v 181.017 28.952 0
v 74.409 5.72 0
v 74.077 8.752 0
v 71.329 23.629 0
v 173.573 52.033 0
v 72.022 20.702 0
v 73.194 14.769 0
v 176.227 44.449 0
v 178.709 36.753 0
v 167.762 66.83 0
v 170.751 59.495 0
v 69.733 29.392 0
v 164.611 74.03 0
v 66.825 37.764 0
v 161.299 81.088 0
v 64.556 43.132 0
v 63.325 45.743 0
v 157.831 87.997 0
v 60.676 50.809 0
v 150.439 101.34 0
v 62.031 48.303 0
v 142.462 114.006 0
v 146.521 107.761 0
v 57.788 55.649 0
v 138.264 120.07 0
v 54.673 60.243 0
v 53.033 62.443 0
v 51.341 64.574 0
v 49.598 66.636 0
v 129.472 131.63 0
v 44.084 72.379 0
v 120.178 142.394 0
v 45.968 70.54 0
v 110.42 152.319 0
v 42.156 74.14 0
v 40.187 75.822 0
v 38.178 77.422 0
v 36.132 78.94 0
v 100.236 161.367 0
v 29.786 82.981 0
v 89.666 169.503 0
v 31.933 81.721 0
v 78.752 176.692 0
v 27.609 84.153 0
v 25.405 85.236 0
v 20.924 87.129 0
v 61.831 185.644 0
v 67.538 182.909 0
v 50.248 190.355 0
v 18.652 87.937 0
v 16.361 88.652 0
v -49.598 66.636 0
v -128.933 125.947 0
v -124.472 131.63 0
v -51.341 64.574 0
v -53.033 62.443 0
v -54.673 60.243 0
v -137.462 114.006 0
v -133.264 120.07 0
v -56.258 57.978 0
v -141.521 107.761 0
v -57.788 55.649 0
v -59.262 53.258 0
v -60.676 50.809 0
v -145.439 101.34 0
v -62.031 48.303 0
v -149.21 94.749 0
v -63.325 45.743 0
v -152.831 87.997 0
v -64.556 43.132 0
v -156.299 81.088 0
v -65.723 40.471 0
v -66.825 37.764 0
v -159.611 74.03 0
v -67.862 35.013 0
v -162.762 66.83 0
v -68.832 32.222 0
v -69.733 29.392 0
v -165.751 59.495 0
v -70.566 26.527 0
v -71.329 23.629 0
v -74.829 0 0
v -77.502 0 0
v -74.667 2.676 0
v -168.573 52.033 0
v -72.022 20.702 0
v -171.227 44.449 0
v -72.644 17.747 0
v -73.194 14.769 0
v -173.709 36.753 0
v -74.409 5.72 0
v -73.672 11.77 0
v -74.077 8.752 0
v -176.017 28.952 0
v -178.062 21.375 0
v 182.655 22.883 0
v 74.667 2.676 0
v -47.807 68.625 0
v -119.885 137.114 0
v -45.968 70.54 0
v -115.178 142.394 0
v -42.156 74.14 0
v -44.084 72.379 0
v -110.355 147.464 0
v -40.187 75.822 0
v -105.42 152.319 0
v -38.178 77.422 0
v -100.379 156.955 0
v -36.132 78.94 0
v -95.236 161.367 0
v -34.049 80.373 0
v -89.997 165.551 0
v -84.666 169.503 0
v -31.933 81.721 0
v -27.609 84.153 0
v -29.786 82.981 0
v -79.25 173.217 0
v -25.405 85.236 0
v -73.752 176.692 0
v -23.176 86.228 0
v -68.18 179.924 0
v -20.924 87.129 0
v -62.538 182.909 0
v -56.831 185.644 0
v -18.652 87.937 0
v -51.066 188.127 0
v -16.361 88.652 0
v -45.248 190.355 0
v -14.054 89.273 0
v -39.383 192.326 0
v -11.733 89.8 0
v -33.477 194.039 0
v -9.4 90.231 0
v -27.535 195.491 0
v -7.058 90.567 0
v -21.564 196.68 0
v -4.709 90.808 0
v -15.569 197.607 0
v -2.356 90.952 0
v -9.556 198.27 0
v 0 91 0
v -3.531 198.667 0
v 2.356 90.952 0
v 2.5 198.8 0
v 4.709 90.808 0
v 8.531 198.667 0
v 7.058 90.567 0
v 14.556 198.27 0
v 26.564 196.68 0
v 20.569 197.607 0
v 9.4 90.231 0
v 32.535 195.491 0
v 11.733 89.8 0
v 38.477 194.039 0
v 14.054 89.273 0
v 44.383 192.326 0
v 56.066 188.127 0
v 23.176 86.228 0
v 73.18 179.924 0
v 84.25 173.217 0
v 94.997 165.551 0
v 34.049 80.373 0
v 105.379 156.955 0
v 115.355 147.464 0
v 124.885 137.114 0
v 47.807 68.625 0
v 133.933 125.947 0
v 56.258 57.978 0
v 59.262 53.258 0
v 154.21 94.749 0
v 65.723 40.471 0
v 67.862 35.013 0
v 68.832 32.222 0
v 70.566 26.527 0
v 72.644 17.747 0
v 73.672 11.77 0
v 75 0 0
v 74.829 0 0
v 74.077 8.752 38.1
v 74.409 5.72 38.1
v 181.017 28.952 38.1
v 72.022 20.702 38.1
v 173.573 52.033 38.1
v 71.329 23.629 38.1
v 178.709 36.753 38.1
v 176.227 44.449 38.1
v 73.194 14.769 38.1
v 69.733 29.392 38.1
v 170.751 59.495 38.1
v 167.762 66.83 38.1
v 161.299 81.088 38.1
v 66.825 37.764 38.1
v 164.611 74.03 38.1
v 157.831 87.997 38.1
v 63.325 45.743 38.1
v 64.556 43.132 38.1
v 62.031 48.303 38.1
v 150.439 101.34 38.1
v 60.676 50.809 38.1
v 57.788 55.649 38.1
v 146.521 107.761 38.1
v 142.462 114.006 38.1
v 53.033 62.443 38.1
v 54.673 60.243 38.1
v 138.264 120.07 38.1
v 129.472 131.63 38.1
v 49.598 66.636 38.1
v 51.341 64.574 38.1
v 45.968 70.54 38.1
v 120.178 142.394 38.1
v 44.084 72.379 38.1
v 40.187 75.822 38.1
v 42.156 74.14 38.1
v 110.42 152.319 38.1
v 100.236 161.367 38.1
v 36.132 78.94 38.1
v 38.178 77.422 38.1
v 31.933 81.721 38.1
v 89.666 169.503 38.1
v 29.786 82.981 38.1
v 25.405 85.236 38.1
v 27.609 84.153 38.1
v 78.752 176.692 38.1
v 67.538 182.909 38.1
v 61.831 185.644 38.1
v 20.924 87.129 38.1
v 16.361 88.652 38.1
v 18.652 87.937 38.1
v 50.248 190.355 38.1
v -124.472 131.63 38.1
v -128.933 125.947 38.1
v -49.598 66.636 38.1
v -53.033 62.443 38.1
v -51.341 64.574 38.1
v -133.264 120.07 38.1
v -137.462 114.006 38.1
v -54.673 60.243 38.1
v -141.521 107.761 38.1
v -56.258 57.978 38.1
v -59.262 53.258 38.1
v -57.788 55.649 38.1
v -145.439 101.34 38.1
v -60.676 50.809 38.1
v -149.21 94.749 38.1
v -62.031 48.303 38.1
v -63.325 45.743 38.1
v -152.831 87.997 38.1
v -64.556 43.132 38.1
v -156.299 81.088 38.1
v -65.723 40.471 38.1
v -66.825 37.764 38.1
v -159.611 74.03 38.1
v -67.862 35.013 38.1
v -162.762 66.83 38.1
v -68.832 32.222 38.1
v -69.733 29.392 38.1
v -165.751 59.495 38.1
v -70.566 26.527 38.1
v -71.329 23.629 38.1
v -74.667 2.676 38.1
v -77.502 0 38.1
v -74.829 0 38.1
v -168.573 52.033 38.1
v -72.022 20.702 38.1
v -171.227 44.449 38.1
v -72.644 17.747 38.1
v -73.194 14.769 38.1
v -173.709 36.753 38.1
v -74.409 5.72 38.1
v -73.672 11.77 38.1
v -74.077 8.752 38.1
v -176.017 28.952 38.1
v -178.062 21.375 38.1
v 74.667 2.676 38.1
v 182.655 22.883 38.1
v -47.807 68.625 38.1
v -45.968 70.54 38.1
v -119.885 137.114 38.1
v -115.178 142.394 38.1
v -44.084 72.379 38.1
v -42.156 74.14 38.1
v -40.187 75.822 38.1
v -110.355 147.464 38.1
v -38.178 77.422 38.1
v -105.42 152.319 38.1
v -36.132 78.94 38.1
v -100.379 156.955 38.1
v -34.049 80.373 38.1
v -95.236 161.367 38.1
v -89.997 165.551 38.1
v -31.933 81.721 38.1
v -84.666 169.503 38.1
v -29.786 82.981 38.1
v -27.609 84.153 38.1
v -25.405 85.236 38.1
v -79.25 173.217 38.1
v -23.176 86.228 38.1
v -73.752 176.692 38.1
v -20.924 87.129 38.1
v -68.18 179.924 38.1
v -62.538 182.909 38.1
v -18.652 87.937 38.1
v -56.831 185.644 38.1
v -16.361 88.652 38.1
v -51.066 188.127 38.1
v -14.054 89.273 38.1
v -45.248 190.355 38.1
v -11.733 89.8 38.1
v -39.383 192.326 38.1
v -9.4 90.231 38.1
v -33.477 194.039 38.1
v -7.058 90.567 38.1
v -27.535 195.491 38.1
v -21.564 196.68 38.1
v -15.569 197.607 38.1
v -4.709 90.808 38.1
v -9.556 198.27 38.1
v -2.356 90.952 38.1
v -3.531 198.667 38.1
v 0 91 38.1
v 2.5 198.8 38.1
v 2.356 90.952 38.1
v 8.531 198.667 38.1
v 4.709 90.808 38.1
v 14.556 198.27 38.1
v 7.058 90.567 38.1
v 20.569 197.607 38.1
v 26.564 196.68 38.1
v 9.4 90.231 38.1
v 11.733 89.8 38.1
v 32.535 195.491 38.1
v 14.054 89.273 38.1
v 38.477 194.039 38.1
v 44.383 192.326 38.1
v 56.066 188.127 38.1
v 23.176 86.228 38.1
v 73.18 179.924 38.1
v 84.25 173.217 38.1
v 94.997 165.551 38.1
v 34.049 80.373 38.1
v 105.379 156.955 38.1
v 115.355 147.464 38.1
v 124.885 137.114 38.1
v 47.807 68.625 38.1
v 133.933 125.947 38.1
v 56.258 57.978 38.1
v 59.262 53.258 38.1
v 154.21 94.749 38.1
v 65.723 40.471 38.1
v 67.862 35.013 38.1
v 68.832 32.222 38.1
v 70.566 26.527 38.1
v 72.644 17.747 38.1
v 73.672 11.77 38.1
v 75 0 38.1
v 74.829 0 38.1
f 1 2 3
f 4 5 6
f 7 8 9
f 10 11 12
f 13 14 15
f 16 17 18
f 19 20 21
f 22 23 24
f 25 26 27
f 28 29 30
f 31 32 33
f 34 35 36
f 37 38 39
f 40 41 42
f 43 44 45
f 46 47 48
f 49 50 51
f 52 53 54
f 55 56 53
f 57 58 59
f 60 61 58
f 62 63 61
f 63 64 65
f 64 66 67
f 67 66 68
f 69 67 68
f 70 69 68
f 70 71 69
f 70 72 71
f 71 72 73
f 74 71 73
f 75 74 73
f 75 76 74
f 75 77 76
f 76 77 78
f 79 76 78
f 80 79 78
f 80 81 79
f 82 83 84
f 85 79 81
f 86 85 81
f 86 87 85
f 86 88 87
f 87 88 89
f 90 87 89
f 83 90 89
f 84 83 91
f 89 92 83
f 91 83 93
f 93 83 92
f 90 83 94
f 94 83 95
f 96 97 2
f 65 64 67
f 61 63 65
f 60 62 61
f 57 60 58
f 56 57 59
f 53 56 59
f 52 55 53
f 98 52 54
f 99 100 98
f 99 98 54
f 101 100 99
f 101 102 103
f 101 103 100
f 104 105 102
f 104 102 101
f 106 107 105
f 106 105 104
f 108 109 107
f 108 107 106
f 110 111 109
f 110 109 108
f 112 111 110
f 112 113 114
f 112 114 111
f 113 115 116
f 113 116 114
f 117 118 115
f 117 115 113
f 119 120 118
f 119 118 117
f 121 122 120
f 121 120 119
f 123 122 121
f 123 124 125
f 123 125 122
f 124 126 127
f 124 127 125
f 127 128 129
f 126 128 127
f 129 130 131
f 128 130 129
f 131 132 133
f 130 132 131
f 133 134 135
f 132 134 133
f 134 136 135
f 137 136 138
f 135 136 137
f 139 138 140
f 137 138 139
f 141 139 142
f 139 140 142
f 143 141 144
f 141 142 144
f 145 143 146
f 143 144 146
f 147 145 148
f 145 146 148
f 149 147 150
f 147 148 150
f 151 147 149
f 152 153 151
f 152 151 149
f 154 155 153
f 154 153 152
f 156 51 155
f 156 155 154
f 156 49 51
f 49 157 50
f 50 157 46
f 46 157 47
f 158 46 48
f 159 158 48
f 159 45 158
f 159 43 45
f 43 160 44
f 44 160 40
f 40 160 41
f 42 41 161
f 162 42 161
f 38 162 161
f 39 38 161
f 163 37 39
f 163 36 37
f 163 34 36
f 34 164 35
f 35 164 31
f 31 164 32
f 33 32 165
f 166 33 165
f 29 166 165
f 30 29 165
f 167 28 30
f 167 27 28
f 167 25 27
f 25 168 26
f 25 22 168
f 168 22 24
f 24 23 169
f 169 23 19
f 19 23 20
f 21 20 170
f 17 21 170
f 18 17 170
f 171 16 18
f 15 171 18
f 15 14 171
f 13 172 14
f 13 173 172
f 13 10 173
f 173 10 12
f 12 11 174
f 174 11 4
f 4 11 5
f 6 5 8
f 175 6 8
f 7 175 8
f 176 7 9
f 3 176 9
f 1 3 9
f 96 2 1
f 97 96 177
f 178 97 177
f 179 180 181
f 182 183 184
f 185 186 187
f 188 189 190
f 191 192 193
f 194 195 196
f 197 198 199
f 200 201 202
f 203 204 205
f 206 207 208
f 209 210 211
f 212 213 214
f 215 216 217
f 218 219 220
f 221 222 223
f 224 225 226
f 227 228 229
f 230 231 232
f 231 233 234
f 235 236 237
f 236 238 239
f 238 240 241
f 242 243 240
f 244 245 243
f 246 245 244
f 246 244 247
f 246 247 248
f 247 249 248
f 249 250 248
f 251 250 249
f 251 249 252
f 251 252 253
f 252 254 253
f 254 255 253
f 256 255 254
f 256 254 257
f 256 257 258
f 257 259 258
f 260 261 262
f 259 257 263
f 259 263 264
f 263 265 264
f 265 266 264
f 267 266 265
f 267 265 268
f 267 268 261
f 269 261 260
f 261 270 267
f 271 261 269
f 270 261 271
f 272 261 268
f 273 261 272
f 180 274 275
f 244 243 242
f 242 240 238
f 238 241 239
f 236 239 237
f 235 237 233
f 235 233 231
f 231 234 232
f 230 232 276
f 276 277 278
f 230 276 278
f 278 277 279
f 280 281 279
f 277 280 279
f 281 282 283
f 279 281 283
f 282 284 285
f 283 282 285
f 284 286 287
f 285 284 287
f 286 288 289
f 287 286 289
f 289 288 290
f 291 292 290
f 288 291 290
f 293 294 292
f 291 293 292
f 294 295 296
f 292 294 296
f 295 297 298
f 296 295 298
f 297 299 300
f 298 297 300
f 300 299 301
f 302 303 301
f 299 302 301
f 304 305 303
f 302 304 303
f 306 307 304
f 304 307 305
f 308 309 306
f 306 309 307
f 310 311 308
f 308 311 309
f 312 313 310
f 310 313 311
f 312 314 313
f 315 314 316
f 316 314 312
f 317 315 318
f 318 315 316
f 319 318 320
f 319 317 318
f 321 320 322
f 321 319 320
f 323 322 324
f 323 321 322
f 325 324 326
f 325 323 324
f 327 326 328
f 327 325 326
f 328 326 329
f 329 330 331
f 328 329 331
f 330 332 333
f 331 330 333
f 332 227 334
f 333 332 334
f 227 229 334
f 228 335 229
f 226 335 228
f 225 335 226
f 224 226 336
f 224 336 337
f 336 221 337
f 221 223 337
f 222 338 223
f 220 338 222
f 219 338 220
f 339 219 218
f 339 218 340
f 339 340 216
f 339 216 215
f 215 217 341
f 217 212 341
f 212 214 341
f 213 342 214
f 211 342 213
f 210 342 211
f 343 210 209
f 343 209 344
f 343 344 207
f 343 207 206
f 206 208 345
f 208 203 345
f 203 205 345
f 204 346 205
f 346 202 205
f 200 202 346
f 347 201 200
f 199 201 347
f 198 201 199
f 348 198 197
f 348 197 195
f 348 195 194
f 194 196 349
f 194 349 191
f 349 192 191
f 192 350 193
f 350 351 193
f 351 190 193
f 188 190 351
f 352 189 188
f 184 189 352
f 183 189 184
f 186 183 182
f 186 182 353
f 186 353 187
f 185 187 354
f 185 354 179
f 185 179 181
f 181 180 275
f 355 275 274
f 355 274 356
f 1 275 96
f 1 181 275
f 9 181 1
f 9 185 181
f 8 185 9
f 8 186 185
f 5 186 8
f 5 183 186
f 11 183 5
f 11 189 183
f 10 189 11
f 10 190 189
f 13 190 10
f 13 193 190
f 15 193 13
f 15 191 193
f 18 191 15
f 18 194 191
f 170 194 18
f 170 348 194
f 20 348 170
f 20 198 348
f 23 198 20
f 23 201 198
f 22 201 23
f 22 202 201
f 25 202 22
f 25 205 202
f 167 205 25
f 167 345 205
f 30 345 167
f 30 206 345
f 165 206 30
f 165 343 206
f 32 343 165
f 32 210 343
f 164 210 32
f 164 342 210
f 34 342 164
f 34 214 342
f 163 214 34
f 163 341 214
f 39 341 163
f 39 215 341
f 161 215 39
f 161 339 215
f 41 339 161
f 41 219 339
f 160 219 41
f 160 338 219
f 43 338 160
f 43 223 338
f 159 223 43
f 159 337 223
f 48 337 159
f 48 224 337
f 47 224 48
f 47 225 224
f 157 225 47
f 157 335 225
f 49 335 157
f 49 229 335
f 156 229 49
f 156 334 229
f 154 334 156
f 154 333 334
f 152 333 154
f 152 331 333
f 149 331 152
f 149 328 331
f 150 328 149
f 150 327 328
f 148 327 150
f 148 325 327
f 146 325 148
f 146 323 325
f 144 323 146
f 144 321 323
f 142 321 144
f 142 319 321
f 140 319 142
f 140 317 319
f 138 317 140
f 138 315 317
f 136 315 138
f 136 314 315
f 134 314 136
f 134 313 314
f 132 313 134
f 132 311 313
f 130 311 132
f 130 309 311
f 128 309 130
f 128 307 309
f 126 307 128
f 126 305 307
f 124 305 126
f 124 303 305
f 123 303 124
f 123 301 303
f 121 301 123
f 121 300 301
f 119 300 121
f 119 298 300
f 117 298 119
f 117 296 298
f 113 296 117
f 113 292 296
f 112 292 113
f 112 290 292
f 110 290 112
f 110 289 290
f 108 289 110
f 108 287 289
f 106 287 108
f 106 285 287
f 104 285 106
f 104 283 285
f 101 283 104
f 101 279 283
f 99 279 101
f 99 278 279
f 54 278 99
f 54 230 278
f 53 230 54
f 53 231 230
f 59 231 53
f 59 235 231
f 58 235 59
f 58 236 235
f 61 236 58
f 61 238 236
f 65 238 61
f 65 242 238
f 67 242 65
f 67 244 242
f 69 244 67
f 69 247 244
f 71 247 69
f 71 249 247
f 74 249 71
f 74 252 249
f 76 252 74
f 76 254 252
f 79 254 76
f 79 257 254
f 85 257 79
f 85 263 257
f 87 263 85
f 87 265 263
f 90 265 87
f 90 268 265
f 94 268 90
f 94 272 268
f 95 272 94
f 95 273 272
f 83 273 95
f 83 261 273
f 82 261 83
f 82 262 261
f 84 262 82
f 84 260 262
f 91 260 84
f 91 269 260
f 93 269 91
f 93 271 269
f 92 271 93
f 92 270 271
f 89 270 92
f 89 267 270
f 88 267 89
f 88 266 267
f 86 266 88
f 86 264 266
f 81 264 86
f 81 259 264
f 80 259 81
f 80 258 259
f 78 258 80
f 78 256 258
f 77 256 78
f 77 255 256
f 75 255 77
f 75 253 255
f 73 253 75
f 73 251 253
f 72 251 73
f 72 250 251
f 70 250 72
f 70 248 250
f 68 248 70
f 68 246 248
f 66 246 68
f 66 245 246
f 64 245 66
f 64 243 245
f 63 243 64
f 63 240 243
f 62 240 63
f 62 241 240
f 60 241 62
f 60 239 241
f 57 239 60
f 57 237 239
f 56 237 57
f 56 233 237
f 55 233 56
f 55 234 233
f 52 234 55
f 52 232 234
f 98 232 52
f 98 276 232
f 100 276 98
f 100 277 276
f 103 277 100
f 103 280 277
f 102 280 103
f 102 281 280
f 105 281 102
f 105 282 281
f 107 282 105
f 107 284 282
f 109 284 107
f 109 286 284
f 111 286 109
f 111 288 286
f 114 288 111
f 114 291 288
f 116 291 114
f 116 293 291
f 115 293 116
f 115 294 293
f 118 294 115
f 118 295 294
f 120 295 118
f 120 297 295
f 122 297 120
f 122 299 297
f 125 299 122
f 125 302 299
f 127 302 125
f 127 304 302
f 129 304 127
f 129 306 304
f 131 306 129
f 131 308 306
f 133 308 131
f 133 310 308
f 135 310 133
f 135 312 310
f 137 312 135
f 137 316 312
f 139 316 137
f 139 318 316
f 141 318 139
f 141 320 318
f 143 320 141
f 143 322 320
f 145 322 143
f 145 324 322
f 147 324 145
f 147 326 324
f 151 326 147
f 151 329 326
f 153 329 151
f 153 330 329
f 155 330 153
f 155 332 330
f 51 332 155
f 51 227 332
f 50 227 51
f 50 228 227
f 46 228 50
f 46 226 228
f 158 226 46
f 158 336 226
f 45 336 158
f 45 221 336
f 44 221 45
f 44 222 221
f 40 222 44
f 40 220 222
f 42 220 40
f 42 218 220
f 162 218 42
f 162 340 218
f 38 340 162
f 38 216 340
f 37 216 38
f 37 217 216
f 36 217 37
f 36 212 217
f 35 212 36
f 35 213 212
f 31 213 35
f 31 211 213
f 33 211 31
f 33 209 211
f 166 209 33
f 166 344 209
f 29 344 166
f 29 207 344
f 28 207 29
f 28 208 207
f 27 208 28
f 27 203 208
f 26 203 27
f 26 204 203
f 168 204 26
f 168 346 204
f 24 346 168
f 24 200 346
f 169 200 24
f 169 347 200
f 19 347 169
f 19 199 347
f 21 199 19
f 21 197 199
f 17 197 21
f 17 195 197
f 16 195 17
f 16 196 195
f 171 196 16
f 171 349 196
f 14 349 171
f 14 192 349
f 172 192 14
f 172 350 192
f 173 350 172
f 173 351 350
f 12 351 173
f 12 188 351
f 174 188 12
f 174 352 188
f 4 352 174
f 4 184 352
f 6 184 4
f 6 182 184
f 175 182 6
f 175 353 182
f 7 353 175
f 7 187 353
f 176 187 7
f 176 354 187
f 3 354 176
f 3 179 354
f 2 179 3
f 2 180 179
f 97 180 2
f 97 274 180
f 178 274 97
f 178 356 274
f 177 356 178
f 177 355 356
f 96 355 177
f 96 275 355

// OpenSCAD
$fn = 200;

module filter() {
  linear_extrude(height=38.1)
  difference() {
    difference() {
      // outer circle
      scale([1,1.4,1]) {
        translate([2.5,-50,0]) {
          color([0,1,0])  circle(192);
        }
      }

      // inner circle (stretched)
      scale([1,1.3,1]) {
        translate([0,-5,0]) {
          color([1,0,0])  circle(75);
        }
      }
    }


    union() {

      // remove extra left side
      translate([-75,-205,0]) {
      rotate([0,0,78])
        color([1,0,0])
        square(200);
      }

      // remove extra right side
      translate([75,0,0]) {
      rotate([0,0,-78])
        color([1,0,0])
        square(1000);
      }

      // remove extra top side
      translate([-200,-350, 0]) {
        color([1,0,0])
          square(350);
      }
    }
  }
}

filter();
